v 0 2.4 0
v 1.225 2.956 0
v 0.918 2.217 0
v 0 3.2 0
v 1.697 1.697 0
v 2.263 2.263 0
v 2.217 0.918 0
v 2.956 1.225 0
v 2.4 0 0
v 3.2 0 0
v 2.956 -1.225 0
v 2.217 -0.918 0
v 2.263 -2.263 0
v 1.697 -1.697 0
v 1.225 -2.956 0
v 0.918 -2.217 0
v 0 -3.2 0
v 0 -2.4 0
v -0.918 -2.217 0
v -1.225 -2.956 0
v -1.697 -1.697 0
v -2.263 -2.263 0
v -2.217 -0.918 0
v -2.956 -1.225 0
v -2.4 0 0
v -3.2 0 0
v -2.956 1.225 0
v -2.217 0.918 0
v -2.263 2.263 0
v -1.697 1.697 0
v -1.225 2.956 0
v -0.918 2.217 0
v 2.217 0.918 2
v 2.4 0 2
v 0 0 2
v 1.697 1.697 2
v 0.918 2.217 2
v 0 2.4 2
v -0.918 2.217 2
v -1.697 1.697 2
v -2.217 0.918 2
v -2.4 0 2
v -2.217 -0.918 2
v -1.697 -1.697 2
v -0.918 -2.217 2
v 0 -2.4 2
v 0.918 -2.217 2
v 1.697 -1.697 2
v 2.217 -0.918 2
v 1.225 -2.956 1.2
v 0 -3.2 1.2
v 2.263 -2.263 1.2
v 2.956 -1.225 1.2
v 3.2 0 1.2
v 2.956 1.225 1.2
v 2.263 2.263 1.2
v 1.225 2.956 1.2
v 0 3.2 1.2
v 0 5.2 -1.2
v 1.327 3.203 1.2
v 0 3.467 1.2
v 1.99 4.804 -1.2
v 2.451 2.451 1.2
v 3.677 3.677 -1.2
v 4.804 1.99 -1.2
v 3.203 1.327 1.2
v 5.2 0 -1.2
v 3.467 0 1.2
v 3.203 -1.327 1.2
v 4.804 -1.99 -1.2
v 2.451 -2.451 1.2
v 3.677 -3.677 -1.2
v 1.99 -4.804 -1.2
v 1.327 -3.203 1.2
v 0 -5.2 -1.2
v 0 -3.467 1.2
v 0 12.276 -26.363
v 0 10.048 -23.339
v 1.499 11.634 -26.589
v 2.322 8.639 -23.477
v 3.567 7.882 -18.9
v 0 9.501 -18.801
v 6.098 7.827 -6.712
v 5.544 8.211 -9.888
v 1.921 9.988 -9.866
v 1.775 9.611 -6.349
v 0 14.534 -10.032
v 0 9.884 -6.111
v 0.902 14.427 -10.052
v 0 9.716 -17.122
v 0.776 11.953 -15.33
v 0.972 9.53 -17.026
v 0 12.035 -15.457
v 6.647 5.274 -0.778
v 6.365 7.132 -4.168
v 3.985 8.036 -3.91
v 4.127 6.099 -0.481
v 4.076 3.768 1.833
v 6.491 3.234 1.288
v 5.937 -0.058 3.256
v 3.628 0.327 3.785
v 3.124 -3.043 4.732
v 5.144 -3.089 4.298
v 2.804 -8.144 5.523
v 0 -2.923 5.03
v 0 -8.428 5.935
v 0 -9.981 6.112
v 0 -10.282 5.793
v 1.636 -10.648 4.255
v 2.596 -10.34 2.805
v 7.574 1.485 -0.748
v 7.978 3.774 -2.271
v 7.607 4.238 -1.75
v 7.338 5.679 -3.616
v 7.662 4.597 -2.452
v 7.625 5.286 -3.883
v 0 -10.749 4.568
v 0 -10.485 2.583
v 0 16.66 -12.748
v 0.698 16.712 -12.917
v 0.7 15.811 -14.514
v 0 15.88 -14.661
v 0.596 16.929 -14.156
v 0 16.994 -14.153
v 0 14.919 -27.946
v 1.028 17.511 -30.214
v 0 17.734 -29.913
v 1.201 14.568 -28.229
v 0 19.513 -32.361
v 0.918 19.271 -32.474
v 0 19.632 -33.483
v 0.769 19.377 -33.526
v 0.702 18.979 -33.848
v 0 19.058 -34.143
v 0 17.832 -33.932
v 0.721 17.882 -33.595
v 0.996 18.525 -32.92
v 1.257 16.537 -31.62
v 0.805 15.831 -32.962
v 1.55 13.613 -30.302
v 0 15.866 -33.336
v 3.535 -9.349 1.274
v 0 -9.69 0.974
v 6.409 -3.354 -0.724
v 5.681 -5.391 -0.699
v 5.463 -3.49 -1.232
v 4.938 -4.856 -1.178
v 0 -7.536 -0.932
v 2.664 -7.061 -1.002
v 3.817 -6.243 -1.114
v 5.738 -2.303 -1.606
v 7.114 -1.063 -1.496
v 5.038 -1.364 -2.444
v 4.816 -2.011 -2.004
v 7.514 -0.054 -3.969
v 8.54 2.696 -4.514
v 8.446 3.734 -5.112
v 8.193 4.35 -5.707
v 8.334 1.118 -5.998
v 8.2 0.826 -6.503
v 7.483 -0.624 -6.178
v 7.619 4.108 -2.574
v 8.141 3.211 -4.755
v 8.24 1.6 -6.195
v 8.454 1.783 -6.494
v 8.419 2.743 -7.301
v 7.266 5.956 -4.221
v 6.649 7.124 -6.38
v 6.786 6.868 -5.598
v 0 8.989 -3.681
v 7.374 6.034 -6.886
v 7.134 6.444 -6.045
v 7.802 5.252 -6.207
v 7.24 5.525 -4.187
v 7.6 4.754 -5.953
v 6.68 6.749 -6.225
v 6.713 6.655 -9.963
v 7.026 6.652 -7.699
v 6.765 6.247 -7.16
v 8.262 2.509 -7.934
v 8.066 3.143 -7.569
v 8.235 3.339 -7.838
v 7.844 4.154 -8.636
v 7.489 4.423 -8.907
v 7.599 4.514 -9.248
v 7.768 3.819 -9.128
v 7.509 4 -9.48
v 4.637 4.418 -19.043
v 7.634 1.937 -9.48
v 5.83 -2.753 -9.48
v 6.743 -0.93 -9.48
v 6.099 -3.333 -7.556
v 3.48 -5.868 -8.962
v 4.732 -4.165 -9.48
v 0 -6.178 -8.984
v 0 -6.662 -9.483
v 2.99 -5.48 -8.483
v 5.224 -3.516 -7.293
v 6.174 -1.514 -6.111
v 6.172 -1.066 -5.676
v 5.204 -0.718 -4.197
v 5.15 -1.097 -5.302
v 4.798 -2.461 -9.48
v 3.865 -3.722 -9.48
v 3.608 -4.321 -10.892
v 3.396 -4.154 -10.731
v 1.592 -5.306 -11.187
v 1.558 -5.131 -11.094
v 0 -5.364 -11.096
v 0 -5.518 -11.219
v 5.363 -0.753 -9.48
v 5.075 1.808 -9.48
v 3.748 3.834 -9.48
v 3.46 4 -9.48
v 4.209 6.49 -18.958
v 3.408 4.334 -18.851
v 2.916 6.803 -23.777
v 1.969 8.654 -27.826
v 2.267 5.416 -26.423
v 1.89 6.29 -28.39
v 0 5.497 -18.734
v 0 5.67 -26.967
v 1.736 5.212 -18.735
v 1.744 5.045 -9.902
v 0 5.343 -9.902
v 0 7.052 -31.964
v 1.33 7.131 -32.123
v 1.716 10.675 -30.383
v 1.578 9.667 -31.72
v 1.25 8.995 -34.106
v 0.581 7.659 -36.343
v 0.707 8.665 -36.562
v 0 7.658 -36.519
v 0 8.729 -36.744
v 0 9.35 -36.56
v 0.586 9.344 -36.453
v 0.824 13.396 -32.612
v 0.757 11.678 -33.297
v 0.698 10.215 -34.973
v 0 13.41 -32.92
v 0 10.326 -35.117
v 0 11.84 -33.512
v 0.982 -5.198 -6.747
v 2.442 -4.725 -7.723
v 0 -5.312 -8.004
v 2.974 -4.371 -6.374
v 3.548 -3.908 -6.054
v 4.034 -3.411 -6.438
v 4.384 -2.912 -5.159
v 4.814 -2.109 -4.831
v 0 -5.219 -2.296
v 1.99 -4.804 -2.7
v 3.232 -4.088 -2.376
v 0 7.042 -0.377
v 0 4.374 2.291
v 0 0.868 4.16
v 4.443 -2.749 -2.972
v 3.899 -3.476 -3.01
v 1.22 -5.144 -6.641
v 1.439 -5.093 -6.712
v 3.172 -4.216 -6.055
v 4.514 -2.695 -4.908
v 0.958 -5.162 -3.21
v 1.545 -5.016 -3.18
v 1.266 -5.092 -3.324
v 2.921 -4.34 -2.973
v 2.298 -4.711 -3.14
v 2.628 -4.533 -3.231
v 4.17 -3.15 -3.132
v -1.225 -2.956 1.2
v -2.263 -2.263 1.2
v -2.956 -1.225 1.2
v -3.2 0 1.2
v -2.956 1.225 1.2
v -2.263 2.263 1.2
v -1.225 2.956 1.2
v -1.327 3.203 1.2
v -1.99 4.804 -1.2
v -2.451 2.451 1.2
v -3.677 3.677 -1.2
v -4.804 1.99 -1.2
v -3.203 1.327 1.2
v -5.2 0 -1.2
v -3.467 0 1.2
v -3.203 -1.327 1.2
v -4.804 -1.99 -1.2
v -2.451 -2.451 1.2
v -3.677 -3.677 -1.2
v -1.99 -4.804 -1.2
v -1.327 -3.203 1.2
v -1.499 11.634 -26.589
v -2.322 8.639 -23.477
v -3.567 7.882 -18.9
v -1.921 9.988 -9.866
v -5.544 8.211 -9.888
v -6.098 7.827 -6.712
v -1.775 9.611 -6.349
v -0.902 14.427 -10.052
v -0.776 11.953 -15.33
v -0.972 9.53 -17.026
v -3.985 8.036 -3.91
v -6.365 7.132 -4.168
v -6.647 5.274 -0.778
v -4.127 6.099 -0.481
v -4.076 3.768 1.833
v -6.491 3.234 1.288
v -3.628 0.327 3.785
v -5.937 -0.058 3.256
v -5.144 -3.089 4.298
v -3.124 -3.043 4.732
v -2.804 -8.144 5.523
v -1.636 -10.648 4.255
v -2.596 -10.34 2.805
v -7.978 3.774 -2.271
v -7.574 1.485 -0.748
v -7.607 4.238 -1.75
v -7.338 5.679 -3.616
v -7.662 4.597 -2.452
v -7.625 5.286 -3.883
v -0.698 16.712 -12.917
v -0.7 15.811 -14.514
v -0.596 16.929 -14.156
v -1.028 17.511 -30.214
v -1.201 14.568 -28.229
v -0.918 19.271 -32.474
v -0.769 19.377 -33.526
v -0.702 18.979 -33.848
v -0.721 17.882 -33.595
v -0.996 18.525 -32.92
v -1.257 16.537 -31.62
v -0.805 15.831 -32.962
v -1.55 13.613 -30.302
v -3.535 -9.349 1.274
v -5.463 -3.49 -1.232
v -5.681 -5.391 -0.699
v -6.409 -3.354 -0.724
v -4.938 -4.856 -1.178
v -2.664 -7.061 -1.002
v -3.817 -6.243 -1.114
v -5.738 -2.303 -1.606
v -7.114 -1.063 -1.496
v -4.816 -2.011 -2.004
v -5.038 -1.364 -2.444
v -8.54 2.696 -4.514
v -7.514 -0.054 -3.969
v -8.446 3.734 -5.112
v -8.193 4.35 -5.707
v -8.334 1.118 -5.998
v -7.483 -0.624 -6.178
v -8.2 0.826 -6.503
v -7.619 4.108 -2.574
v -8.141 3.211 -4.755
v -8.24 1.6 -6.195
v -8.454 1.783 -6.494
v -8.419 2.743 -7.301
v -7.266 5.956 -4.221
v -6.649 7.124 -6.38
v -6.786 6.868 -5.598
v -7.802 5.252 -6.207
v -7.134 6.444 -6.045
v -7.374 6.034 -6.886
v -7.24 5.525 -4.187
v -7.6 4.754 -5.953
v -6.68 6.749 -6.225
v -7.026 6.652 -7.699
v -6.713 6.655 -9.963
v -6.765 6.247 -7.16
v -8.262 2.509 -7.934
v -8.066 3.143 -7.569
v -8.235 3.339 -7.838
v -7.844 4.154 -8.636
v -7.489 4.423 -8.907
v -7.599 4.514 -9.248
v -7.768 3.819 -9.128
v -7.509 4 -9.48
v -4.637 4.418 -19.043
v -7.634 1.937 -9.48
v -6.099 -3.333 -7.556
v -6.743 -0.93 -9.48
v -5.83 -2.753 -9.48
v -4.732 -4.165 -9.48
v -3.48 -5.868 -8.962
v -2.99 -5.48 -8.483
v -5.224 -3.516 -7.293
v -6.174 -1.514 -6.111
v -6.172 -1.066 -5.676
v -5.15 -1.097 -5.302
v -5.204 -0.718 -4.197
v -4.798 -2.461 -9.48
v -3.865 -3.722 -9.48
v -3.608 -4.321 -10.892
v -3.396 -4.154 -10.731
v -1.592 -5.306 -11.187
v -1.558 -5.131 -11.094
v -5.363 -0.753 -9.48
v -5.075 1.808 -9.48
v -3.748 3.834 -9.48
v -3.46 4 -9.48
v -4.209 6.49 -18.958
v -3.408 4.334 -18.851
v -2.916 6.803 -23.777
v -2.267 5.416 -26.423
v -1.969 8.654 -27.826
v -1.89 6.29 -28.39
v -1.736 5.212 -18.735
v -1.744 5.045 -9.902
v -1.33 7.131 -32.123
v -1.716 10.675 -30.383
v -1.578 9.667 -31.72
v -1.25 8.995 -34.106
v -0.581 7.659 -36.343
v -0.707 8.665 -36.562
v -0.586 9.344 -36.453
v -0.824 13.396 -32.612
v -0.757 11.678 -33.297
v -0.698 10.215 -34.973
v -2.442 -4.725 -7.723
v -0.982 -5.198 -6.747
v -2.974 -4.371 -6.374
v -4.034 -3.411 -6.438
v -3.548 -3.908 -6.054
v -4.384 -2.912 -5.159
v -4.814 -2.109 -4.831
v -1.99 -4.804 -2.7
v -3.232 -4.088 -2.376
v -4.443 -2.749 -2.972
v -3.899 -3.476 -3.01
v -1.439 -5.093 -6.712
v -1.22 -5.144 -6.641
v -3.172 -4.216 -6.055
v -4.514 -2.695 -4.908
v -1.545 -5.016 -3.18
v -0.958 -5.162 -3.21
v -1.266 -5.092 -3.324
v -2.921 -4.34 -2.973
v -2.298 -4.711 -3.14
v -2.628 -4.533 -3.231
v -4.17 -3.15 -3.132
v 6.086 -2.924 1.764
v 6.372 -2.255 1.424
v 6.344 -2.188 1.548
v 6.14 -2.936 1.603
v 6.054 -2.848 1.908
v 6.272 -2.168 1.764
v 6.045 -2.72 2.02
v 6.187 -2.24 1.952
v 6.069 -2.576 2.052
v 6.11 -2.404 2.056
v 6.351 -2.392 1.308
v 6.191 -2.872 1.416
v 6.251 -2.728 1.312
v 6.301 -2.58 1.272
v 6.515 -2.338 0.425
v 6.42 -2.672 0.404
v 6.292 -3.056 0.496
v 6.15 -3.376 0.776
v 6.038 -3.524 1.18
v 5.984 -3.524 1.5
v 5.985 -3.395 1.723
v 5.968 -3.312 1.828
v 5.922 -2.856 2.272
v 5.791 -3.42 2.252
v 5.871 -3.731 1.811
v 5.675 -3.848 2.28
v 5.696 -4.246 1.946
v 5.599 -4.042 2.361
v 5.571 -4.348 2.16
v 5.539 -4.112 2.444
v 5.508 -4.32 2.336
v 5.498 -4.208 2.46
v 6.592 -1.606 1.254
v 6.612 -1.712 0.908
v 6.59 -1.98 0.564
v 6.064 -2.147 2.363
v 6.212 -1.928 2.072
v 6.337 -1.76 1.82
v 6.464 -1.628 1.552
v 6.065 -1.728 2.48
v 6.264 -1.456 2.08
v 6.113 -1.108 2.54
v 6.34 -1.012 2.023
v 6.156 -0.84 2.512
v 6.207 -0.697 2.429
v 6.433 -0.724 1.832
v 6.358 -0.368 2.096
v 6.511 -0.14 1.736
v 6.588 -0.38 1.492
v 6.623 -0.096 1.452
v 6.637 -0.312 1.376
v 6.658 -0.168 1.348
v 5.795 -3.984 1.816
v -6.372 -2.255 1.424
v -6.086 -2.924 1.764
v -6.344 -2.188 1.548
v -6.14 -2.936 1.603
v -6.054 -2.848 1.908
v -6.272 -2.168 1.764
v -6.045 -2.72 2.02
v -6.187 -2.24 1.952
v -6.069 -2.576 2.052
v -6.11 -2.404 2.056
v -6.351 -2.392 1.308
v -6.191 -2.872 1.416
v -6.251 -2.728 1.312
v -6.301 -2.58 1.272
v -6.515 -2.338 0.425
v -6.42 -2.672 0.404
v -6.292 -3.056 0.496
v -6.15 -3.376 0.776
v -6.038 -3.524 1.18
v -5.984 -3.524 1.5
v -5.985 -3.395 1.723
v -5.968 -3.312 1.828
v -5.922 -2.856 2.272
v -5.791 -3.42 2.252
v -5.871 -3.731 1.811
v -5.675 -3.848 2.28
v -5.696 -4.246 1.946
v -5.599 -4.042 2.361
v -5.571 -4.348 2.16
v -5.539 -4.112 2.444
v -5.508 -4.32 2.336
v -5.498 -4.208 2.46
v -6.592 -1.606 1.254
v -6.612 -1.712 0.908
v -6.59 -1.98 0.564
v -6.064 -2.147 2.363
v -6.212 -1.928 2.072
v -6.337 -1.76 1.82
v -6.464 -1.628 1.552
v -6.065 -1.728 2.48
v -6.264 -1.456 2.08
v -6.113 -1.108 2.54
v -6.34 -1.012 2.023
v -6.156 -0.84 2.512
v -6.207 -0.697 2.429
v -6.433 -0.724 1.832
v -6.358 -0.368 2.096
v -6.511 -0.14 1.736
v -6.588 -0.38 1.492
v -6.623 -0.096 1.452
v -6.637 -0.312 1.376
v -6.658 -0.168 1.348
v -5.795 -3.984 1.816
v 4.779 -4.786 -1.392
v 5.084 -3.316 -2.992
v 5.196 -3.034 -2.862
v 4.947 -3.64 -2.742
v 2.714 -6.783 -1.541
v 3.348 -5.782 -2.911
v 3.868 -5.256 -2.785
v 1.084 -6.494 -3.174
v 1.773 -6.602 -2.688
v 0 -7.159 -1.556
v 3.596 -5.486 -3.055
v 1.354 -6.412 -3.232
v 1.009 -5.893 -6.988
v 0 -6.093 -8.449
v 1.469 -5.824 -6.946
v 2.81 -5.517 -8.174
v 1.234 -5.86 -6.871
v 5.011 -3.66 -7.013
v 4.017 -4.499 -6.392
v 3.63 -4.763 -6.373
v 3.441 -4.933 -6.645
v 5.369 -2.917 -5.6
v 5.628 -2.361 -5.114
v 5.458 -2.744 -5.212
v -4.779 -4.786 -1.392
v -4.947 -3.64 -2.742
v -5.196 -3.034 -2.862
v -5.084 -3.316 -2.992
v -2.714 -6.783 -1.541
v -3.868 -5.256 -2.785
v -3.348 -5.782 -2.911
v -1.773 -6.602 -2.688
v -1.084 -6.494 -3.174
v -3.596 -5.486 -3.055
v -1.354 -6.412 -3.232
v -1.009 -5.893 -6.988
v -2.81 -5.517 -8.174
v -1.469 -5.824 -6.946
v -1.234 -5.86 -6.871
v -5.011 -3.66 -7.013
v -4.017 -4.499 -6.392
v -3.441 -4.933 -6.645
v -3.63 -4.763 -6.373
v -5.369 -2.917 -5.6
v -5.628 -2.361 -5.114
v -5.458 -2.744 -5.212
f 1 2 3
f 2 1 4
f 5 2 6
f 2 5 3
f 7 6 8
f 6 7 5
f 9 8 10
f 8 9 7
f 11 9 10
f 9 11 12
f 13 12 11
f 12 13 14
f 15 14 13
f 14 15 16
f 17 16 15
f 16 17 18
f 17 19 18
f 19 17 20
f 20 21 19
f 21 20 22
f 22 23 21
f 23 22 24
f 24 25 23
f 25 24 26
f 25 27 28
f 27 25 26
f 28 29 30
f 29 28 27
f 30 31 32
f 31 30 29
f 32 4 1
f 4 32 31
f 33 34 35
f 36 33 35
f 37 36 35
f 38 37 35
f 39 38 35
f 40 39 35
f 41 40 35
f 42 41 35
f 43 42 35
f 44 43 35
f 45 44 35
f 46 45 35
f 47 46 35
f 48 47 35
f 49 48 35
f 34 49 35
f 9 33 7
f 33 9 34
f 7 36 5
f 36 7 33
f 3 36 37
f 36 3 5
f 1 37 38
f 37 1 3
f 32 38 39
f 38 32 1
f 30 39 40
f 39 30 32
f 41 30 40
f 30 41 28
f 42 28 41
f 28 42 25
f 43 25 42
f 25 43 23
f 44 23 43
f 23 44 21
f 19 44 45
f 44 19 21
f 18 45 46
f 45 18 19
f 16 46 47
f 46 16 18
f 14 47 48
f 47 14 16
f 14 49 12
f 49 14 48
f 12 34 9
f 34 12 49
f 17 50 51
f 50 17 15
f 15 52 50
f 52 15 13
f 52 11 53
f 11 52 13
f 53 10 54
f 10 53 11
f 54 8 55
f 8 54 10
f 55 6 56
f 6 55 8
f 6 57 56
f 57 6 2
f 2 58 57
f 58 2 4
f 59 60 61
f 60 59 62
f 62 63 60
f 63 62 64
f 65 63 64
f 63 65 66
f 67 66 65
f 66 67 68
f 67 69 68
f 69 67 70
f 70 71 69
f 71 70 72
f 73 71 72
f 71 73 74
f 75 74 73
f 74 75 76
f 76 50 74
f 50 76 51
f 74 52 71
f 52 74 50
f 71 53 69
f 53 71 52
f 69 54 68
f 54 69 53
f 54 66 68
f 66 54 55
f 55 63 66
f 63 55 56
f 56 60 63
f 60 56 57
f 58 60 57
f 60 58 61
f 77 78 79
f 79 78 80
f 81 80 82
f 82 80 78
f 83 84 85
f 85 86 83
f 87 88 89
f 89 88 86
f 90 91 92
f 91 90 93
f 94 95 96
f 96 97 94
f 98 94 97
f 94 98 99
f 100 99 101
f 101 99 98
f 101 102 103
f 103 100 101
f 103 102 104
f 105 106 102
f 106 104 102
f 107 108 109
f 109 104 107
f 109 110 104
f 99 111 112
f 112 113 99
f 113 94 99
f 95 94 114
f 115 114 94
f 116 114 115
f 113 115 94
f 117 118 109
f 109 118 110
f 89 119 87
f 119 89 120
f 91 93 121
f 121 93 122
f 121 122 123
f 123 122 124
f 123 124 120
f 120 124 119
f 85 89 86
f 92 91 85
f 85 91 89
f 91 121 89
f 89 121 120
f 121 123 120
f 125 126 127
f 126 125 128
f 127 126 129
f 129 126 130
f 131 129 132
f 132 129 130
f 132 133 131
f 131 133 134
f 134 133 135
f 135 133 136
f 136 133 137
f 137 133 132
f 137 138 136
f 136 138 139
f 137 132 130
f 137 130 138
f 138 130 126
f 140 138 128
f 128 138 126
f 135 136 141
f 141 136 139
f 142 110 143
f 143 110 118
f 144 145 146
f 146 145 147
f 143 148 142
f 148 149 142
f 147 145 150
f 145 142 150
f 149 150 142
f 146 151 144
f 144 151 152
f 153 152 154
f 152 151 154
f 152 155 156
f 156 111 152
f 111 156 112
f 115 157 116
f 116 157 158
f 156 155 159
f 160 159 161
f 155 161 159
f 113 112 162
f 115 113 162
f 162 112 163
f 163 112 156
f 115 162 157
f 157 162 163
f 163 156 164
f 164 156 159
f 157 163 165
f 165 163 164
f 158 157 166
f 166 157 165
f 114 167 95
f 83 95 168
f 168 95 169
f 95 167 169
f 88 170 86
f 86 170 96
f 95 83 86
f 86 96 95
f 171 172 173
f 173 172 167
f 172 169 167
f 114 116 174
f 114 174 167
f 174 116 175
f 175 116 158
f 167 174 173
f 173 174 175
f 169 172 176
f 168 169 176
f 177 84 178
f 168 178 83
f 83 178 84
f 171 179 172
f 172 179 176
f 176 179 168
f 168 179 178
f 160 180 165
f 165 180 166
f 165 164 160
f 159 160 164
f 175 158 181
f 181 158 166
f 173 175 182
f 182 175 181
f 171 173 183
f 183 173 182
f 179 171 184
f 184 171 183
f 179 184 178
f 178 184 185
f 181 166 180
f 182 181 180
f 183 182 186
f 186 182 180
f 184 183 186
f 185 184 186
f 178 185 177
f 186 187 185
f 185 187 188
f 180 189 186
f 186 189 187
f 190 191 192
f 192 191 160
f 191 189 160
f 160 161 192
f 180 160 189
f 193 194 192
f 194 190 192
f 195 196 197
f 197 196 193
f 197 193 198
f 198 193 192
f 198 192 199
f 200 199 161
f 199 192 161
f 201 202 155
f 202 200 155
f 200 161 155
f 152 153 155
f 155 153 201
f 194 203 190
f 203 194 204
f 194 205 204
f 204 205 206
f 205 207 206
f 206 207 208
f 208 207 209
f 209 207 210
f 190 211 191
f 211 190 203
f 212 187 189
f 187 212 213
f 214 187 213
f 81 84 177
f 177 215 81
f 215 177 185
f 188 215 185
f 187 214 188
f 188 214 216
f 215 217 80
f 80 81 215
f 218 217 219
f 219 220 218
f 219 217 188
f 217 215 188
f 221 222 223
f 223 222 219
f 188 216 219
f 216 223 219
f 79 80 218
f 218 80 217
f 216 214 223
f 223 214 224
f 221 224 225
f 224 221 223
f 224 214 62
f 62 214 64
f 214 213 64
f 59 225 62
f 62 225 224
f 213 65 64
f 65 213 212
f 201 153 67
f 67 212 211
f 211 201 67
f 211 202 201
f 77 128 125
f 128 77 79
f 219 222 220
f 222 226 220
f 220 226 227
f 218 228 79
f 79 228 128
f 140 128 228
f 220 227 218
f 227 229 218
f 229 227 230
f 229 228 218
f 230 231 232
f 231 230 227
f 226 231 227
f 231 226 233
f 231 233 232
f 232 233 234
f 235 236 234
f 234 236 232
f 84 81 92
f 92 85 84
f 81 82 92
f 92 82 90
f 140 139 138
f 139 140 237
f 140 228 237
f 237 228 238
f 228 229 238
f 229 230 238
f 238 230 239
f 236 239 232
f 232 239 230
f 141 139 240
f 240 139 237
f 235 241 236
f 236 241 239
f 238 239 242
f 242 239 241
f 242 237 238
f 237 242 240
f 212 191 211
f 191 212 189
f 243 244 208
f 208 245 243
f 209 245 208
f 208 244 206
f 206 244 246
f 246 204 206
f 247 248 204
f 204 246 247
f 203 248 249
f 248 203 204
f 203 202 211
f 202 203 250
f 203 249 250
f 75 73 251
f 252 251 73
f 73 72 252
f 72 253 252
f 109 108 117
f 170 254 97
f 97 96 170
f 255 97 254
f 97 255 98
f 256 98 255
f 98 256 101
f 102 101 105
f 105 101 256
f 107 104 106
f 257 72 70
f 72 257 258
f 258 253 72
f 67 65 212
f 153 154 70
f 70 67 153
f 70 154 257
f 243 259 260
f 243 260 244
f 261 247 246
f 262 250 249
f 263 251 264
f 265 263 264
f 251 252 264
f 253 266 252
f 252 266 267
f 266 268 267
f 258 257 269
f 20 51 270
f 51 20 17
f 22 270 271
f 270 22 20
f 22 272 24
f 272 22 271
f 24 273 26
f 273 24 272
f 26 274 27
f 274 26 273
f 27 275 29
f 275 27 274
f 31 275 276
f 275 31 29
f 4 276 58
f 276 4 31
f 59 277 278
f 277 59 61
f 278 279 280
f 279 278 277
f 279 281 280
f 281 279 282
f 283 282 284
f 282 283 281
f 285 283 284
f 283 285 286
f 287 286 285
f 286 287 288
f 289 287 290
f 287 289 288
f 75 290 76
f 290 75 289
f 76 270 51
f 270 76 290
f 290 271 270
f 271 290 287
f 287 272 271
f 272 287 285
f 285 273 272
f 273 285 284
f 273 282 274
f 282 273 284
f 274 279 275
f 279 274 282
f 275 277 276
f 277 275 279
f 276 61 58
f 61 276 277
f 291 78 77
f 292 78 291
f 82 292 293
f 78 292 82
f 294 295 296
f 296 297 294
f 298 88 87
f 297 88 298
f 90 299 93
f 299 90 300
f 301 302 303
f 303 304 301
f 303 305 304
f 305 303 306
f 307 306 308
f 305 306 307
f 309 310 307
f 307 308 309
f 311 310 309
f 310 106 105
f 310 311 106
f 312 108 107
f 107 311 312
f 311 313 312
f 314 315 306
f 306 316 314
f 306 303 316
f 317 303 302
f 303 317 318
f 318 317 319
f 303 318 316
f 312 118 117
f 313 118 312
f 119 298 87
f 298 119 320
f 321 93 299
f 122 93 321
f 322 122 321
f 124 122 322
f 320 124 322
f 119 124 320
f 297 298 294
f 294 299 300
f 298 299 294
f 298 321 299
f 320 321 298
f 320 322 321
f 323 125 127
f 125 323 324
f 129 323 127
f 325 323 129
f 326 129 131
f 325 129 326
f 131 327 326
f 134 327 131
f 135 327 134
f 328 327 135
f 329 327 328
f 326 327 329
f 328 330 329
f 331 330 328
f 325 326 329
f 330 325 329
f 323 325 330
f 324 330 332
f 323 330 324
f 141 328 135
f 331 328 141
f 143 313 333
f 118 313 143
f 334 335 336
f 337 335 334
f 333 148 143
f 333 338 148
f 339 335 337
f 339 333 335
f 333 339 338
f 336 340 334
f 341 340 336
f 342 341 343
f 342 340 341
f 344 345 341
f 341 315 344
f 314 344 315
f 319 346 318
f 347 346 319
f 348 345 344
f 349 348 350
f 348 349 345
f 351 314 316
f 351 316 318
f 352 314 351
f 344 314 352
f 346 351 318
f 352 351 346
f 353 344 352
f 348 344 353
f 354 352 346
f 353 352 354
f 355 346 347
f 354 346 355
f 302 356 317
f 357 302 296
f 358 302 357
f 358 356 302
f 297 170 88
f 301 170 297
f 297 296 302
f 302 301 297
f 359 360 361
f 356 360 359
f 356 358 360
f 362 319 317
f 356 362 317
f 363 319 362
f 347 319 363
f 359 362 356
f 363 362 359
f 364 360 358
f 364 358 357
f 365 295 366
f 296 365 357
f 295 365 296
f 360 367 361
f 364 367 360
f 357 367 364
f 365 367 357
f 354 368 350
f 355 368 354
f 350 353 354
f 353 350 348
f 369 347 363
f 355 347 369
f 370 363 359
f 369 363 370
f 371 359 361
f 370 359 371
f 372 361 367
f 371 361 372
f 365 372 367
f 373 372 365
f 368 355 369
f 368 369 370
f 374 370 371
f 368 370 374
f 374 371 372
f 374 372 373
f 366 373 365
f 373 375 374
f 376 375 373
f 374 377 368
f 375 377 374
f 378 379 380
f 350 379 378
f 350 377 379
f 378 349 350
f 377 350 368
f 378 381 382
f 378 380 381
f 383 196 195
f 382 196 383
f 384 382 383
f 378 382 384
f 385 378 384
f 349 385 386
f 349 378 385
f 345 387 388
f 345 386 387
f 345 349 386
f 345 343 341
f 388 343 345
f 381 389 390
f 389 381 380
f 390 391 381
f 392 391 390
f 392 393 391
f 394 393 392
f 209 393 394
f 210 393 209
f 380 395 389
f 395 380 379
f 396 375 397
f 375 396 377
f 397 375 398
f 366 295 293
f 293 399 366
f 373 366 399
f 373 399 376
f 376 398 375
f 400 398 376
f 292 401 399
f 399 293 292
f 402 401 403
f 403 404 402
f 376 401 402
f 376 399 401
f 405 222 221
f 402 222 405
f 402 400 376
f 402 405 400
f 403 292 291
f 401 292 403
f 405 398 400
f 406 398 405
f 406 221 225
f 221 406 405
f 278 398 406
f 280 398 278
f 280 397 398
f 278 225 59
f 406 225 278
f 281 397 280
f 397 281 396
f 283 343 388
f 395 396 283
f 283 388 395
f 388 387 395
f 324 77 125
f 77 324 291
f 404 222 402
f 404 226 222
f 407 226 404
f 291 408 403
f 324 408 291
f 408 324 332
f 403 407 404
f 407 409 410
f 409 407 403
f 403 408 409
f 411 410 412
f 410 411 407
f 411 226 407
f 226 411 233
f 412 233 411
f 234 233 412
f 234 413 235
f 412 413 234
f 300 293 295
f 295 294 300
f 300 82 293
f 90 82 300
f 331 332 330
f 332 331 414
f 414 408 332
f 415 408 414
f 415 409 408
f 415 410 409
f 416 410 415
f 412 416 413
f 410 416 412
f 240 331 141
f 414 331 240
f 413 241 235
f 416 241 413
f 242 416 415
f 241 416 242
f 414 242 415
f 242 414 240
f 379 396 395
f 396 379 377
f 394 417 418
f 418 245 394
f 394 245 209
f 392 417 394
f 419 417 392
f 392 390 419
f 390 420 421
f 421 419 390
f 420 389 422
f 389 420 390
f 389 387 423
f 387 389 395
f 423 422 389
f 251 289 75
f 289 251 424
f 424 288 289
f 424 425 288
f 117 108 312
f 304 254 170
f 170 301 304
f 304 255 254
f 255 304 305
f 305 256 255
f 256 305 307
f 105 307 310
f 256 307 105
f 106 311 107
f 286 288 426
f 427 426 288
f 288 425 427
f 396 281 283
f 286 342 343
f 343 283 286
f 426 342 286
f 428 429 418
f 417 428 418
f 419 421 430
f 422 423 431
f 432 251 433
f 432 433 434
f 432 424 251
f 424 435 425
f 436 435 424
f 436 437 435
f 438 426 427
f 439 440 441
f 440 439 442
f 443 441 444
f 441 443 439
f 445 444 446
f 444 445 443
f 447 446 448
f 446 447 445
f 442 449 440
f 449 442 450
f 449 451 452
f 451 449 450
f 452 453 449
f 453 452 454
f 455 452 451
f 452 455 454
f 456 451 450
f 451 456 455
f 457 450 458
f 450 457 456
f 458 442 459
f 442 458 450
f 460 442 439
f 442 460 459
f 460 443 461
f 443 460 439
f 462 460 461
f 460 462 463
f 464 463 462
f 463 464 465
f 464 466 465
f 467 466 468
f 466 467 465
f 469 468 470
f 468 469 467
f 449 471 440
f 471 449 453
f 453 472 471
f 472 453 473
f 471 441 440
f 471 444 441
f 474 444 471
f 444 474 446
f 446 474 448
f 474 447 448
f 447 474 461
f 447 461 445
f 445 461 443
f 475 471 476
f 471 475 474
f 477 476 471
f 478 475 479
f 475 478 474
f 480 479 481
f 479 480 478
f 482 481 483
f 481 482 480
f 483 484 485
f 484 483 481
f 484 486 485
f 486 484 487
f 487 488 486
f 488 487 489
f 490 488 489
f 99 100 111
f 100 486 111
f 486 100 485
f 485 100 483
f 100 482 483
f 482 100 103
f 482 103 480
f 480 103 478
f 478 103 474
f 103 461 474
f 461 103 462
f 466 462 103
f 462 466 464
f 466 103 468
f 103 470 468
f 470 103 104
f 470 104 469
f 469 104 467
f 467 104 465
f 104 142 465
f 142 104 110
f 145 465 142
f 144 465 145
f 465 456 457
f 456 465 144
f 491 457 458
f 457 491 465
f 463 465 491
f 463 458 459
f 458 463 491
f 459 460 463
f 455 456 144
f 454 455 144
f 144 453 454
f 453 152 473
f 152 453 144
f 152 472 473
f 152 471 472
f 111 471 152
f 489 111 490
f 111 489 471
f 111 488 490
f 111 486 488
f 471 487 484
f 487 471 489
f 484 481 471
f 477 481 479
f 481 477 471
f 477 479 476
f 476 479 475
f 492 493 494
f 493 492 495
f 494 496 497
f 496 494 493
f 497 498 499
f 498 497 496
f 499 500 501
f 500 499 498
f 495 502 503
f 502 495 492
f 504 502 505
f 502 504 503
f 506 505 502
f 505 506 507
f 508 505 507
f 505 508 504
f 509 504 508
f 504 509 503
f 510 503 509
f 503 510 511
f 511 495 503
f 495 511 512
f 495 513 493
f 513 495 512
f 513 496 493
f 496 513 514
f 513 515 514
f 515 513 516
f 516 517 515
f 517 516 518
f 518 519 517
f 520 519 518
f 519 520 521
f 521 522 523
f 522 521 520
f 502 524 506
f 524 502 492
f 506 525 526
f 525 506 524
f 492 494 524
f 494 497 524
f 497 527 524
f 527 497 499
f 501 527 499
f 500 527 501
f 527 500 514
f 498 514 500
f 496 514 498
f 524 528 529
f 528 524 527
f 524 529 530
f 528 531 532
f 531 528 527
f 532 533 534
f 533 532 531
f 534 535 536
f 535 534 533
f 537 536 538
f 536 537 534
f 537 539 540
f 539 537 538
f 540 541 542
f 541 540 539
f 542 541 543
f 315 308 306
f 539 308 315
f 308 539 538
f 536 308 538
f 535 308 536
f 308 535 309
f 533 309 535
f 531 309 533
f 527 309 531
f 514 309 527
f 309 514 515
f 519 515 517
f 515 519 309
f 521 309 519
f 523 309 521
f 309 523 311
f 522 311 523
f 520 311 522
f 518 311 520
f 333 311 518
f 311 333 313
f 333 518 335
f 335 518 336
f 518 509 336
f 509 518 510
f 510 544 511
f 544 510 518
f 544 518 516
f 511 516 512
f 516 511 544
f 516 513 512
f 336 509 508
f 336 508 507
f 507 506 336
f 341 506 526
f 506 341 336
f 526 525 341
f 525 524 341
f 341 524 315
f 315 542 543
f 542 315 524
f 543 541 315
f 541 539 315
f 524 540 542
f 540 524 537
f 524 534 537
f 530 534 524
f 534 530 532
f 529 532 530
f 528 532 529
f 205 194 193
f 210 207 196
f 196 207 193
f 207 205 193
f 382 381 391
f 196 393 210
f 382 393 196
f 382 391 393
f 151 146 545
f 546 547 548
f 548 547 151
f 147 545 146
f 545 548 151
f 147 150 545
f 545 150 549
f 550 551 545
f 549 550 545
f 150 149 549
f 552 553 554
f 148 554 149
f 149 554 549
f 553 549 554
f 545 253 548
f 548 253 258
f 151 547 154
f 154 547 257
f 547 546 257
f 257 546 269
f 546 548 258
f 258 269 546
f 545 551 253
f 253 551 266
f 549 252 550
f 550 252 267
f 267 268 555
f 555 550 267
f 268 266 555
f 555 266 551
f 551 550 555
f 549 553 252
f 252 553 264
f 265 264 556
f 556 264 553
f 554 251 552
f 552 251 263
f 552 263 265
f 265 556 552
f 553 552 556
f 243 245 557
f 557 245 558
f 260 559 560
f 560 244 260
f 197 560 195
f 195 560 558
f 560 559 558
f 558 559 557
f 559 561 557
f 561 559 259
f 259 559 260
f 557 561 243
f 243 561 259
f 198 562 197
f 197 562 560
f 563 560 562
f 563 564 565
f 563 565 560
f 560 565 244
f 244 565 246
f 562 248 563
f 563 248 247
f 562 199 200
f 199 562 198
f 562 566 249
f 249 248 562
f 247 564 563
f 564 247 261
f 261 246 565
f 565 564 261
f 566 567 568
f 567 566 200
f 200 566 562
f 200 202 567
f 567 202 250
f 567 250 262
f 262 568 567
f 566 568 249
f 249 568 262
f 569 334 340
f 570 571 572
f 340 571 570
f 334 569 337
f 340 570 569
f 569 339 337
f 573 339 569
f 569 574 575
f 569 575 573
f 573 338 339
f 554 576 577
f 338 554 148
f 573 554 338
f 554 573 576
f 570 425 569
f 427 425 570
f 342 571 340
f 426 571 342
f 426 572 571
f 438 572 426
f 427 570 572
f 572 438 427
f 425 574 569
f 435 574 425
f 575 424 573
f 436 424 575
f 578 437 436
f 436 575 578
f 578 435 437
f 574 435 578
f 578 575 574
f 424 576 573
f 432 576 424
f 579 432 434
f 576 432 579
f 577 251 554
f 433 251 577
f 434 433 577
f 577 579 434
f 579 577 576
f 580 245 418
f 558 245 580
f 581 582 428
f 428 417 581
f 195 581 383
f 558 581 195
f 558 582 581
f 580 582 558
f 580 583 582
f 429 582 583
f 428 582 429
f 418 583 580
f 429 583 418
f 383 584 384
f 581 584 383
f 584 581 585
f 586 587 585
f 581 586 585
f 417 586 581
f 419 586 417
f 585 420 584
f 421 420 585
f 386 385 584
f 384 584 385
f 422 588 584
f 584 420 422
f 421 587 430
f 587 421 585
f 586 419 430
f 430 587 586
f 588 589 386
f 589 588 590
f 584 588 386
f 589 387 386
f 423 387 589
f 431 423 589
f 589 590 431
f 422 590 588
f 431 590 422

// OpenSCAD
use <../lib.scad>
use <s/24076p01s01.scad>
use <s/24076s01.scad>
use <s/24076s03.scad>
use <s/24076s04.scad>
use <../p/stud4o.scad>
$fa=1; $fs=0.2;
function ldraw_lib__24076p01(realsolid=false) = [
// 0 Minifig Headdress Shark with Tail and Fin with Black Eye and White Teeth Pattern
// 0 Name: 24076p01.dat
// 0 Author: Philippe Hurbain [Philo]
// 0 !LDRAW_ORG Part UPDATE 2020-01
// 0 !LICENSE Licensed under CC BY 2.0 and CC BY 4.0 : see CAreadme.txt
// 
// 0 BFC CERTIFY CCW
  [0,"BFC","CERTIFY"],
  [0,"BFC","CCW"],
// 
// 0 !CATEGORY Minifig Headwear
// 0 !KEYWORDS Series 15, Suit
// 
// 0 !HISTORY 2016-03-18 {LEGO Digital Designer} Original part shape
// 0 !HISTORY 2019-05-20 [Philo] File preparation for LDraw Parts Tracker
// 0 !HISTORY 2020-06-28 [PTadmin] Official Update 2020-01
// 
// 
// 1 16 0 -5 0 -1 0 0 0 -1.25 0 0 0 1 stud4o.dat
  [1,16,0,-5,0,-1,0,0,0,-1.25,0,0,0,1, ldraw_lib__stud4o(realsolid)],
// 1 16 0 0 0 1 0 0 0 1 0 0 0 1 s\24076s01.dat
  [1,16,0,0,0,1,0,0,0,1,0,0,0,1, ldraw_lib__s__24076s01(realsolid)],
// 1 16 0 0 0 -1 0 0 0 1 0 0 0 1 s\24076s01.dat
  [1,16,0,0,0,-1,0,0,0,1,0,0,0,1, ldraw_lib__s__24076s01(realsolid)],
// 1 16 0 0 0 1 0 0 0 1 0 0 0 1 s\24076p01s01.dat
  [1,16,0,0,0,1,0,0,0,1,0,0,0,1, ldraw_lib__s__24076p01s01(realsolid)],
// 1 16 0 0 0 -1 0 0 0 1 0 0 0 1 s\24076p01s01.dat
  [1,16,0,0,0,-1,0,0,0,1,0,0,0,1, ldraw_lib__s__24076p01s01(realsolid)],
// 1 16 0 0 0 1 0 0 0 1 0 0 0 1 s\24076s03.dat
  [1,16,0,0,0,1,0,0,0,1,0,0,0,1, ldraw_lib__s__24076s03(realsolid)],
// 1 16 0 0 0 -1 0 0 0 1 0 0 0 1 s\24076s03.dat
  [1,16,0,0,0,-1,0,0,0,1,0,0,0,1, ldraw_lib__s__24076s03(realsolid)],
// 1 15 0 0 0 1 0 0 0 1 0 0 0 1 s\24076s04.dat
  [1,15,0,0,0,1,0,0,0,1,0,0,0,1, ldraw_lib__s__24076s04(realsolid)],
// 1 15 0 0 0 -1 0 0 0 1 0 0 0 1 s\24076s04.dat
  [1,15,0,0,0,-1,0,0,0,1,0,0,0,1, ldraw_lib__s__24076s04(realsolid)],
];
module ldraw_lib__24076p01(step=0, col=false, unit=2/5, alt=false, line=0.2, solid=!$preview)
    makepoly(ldraw_lib__24076p01(solid), step=step, col=col, unit=unit, alt=alt, line=line, solid=solid);
ldraw_lib__24076p01(line=0.2);
